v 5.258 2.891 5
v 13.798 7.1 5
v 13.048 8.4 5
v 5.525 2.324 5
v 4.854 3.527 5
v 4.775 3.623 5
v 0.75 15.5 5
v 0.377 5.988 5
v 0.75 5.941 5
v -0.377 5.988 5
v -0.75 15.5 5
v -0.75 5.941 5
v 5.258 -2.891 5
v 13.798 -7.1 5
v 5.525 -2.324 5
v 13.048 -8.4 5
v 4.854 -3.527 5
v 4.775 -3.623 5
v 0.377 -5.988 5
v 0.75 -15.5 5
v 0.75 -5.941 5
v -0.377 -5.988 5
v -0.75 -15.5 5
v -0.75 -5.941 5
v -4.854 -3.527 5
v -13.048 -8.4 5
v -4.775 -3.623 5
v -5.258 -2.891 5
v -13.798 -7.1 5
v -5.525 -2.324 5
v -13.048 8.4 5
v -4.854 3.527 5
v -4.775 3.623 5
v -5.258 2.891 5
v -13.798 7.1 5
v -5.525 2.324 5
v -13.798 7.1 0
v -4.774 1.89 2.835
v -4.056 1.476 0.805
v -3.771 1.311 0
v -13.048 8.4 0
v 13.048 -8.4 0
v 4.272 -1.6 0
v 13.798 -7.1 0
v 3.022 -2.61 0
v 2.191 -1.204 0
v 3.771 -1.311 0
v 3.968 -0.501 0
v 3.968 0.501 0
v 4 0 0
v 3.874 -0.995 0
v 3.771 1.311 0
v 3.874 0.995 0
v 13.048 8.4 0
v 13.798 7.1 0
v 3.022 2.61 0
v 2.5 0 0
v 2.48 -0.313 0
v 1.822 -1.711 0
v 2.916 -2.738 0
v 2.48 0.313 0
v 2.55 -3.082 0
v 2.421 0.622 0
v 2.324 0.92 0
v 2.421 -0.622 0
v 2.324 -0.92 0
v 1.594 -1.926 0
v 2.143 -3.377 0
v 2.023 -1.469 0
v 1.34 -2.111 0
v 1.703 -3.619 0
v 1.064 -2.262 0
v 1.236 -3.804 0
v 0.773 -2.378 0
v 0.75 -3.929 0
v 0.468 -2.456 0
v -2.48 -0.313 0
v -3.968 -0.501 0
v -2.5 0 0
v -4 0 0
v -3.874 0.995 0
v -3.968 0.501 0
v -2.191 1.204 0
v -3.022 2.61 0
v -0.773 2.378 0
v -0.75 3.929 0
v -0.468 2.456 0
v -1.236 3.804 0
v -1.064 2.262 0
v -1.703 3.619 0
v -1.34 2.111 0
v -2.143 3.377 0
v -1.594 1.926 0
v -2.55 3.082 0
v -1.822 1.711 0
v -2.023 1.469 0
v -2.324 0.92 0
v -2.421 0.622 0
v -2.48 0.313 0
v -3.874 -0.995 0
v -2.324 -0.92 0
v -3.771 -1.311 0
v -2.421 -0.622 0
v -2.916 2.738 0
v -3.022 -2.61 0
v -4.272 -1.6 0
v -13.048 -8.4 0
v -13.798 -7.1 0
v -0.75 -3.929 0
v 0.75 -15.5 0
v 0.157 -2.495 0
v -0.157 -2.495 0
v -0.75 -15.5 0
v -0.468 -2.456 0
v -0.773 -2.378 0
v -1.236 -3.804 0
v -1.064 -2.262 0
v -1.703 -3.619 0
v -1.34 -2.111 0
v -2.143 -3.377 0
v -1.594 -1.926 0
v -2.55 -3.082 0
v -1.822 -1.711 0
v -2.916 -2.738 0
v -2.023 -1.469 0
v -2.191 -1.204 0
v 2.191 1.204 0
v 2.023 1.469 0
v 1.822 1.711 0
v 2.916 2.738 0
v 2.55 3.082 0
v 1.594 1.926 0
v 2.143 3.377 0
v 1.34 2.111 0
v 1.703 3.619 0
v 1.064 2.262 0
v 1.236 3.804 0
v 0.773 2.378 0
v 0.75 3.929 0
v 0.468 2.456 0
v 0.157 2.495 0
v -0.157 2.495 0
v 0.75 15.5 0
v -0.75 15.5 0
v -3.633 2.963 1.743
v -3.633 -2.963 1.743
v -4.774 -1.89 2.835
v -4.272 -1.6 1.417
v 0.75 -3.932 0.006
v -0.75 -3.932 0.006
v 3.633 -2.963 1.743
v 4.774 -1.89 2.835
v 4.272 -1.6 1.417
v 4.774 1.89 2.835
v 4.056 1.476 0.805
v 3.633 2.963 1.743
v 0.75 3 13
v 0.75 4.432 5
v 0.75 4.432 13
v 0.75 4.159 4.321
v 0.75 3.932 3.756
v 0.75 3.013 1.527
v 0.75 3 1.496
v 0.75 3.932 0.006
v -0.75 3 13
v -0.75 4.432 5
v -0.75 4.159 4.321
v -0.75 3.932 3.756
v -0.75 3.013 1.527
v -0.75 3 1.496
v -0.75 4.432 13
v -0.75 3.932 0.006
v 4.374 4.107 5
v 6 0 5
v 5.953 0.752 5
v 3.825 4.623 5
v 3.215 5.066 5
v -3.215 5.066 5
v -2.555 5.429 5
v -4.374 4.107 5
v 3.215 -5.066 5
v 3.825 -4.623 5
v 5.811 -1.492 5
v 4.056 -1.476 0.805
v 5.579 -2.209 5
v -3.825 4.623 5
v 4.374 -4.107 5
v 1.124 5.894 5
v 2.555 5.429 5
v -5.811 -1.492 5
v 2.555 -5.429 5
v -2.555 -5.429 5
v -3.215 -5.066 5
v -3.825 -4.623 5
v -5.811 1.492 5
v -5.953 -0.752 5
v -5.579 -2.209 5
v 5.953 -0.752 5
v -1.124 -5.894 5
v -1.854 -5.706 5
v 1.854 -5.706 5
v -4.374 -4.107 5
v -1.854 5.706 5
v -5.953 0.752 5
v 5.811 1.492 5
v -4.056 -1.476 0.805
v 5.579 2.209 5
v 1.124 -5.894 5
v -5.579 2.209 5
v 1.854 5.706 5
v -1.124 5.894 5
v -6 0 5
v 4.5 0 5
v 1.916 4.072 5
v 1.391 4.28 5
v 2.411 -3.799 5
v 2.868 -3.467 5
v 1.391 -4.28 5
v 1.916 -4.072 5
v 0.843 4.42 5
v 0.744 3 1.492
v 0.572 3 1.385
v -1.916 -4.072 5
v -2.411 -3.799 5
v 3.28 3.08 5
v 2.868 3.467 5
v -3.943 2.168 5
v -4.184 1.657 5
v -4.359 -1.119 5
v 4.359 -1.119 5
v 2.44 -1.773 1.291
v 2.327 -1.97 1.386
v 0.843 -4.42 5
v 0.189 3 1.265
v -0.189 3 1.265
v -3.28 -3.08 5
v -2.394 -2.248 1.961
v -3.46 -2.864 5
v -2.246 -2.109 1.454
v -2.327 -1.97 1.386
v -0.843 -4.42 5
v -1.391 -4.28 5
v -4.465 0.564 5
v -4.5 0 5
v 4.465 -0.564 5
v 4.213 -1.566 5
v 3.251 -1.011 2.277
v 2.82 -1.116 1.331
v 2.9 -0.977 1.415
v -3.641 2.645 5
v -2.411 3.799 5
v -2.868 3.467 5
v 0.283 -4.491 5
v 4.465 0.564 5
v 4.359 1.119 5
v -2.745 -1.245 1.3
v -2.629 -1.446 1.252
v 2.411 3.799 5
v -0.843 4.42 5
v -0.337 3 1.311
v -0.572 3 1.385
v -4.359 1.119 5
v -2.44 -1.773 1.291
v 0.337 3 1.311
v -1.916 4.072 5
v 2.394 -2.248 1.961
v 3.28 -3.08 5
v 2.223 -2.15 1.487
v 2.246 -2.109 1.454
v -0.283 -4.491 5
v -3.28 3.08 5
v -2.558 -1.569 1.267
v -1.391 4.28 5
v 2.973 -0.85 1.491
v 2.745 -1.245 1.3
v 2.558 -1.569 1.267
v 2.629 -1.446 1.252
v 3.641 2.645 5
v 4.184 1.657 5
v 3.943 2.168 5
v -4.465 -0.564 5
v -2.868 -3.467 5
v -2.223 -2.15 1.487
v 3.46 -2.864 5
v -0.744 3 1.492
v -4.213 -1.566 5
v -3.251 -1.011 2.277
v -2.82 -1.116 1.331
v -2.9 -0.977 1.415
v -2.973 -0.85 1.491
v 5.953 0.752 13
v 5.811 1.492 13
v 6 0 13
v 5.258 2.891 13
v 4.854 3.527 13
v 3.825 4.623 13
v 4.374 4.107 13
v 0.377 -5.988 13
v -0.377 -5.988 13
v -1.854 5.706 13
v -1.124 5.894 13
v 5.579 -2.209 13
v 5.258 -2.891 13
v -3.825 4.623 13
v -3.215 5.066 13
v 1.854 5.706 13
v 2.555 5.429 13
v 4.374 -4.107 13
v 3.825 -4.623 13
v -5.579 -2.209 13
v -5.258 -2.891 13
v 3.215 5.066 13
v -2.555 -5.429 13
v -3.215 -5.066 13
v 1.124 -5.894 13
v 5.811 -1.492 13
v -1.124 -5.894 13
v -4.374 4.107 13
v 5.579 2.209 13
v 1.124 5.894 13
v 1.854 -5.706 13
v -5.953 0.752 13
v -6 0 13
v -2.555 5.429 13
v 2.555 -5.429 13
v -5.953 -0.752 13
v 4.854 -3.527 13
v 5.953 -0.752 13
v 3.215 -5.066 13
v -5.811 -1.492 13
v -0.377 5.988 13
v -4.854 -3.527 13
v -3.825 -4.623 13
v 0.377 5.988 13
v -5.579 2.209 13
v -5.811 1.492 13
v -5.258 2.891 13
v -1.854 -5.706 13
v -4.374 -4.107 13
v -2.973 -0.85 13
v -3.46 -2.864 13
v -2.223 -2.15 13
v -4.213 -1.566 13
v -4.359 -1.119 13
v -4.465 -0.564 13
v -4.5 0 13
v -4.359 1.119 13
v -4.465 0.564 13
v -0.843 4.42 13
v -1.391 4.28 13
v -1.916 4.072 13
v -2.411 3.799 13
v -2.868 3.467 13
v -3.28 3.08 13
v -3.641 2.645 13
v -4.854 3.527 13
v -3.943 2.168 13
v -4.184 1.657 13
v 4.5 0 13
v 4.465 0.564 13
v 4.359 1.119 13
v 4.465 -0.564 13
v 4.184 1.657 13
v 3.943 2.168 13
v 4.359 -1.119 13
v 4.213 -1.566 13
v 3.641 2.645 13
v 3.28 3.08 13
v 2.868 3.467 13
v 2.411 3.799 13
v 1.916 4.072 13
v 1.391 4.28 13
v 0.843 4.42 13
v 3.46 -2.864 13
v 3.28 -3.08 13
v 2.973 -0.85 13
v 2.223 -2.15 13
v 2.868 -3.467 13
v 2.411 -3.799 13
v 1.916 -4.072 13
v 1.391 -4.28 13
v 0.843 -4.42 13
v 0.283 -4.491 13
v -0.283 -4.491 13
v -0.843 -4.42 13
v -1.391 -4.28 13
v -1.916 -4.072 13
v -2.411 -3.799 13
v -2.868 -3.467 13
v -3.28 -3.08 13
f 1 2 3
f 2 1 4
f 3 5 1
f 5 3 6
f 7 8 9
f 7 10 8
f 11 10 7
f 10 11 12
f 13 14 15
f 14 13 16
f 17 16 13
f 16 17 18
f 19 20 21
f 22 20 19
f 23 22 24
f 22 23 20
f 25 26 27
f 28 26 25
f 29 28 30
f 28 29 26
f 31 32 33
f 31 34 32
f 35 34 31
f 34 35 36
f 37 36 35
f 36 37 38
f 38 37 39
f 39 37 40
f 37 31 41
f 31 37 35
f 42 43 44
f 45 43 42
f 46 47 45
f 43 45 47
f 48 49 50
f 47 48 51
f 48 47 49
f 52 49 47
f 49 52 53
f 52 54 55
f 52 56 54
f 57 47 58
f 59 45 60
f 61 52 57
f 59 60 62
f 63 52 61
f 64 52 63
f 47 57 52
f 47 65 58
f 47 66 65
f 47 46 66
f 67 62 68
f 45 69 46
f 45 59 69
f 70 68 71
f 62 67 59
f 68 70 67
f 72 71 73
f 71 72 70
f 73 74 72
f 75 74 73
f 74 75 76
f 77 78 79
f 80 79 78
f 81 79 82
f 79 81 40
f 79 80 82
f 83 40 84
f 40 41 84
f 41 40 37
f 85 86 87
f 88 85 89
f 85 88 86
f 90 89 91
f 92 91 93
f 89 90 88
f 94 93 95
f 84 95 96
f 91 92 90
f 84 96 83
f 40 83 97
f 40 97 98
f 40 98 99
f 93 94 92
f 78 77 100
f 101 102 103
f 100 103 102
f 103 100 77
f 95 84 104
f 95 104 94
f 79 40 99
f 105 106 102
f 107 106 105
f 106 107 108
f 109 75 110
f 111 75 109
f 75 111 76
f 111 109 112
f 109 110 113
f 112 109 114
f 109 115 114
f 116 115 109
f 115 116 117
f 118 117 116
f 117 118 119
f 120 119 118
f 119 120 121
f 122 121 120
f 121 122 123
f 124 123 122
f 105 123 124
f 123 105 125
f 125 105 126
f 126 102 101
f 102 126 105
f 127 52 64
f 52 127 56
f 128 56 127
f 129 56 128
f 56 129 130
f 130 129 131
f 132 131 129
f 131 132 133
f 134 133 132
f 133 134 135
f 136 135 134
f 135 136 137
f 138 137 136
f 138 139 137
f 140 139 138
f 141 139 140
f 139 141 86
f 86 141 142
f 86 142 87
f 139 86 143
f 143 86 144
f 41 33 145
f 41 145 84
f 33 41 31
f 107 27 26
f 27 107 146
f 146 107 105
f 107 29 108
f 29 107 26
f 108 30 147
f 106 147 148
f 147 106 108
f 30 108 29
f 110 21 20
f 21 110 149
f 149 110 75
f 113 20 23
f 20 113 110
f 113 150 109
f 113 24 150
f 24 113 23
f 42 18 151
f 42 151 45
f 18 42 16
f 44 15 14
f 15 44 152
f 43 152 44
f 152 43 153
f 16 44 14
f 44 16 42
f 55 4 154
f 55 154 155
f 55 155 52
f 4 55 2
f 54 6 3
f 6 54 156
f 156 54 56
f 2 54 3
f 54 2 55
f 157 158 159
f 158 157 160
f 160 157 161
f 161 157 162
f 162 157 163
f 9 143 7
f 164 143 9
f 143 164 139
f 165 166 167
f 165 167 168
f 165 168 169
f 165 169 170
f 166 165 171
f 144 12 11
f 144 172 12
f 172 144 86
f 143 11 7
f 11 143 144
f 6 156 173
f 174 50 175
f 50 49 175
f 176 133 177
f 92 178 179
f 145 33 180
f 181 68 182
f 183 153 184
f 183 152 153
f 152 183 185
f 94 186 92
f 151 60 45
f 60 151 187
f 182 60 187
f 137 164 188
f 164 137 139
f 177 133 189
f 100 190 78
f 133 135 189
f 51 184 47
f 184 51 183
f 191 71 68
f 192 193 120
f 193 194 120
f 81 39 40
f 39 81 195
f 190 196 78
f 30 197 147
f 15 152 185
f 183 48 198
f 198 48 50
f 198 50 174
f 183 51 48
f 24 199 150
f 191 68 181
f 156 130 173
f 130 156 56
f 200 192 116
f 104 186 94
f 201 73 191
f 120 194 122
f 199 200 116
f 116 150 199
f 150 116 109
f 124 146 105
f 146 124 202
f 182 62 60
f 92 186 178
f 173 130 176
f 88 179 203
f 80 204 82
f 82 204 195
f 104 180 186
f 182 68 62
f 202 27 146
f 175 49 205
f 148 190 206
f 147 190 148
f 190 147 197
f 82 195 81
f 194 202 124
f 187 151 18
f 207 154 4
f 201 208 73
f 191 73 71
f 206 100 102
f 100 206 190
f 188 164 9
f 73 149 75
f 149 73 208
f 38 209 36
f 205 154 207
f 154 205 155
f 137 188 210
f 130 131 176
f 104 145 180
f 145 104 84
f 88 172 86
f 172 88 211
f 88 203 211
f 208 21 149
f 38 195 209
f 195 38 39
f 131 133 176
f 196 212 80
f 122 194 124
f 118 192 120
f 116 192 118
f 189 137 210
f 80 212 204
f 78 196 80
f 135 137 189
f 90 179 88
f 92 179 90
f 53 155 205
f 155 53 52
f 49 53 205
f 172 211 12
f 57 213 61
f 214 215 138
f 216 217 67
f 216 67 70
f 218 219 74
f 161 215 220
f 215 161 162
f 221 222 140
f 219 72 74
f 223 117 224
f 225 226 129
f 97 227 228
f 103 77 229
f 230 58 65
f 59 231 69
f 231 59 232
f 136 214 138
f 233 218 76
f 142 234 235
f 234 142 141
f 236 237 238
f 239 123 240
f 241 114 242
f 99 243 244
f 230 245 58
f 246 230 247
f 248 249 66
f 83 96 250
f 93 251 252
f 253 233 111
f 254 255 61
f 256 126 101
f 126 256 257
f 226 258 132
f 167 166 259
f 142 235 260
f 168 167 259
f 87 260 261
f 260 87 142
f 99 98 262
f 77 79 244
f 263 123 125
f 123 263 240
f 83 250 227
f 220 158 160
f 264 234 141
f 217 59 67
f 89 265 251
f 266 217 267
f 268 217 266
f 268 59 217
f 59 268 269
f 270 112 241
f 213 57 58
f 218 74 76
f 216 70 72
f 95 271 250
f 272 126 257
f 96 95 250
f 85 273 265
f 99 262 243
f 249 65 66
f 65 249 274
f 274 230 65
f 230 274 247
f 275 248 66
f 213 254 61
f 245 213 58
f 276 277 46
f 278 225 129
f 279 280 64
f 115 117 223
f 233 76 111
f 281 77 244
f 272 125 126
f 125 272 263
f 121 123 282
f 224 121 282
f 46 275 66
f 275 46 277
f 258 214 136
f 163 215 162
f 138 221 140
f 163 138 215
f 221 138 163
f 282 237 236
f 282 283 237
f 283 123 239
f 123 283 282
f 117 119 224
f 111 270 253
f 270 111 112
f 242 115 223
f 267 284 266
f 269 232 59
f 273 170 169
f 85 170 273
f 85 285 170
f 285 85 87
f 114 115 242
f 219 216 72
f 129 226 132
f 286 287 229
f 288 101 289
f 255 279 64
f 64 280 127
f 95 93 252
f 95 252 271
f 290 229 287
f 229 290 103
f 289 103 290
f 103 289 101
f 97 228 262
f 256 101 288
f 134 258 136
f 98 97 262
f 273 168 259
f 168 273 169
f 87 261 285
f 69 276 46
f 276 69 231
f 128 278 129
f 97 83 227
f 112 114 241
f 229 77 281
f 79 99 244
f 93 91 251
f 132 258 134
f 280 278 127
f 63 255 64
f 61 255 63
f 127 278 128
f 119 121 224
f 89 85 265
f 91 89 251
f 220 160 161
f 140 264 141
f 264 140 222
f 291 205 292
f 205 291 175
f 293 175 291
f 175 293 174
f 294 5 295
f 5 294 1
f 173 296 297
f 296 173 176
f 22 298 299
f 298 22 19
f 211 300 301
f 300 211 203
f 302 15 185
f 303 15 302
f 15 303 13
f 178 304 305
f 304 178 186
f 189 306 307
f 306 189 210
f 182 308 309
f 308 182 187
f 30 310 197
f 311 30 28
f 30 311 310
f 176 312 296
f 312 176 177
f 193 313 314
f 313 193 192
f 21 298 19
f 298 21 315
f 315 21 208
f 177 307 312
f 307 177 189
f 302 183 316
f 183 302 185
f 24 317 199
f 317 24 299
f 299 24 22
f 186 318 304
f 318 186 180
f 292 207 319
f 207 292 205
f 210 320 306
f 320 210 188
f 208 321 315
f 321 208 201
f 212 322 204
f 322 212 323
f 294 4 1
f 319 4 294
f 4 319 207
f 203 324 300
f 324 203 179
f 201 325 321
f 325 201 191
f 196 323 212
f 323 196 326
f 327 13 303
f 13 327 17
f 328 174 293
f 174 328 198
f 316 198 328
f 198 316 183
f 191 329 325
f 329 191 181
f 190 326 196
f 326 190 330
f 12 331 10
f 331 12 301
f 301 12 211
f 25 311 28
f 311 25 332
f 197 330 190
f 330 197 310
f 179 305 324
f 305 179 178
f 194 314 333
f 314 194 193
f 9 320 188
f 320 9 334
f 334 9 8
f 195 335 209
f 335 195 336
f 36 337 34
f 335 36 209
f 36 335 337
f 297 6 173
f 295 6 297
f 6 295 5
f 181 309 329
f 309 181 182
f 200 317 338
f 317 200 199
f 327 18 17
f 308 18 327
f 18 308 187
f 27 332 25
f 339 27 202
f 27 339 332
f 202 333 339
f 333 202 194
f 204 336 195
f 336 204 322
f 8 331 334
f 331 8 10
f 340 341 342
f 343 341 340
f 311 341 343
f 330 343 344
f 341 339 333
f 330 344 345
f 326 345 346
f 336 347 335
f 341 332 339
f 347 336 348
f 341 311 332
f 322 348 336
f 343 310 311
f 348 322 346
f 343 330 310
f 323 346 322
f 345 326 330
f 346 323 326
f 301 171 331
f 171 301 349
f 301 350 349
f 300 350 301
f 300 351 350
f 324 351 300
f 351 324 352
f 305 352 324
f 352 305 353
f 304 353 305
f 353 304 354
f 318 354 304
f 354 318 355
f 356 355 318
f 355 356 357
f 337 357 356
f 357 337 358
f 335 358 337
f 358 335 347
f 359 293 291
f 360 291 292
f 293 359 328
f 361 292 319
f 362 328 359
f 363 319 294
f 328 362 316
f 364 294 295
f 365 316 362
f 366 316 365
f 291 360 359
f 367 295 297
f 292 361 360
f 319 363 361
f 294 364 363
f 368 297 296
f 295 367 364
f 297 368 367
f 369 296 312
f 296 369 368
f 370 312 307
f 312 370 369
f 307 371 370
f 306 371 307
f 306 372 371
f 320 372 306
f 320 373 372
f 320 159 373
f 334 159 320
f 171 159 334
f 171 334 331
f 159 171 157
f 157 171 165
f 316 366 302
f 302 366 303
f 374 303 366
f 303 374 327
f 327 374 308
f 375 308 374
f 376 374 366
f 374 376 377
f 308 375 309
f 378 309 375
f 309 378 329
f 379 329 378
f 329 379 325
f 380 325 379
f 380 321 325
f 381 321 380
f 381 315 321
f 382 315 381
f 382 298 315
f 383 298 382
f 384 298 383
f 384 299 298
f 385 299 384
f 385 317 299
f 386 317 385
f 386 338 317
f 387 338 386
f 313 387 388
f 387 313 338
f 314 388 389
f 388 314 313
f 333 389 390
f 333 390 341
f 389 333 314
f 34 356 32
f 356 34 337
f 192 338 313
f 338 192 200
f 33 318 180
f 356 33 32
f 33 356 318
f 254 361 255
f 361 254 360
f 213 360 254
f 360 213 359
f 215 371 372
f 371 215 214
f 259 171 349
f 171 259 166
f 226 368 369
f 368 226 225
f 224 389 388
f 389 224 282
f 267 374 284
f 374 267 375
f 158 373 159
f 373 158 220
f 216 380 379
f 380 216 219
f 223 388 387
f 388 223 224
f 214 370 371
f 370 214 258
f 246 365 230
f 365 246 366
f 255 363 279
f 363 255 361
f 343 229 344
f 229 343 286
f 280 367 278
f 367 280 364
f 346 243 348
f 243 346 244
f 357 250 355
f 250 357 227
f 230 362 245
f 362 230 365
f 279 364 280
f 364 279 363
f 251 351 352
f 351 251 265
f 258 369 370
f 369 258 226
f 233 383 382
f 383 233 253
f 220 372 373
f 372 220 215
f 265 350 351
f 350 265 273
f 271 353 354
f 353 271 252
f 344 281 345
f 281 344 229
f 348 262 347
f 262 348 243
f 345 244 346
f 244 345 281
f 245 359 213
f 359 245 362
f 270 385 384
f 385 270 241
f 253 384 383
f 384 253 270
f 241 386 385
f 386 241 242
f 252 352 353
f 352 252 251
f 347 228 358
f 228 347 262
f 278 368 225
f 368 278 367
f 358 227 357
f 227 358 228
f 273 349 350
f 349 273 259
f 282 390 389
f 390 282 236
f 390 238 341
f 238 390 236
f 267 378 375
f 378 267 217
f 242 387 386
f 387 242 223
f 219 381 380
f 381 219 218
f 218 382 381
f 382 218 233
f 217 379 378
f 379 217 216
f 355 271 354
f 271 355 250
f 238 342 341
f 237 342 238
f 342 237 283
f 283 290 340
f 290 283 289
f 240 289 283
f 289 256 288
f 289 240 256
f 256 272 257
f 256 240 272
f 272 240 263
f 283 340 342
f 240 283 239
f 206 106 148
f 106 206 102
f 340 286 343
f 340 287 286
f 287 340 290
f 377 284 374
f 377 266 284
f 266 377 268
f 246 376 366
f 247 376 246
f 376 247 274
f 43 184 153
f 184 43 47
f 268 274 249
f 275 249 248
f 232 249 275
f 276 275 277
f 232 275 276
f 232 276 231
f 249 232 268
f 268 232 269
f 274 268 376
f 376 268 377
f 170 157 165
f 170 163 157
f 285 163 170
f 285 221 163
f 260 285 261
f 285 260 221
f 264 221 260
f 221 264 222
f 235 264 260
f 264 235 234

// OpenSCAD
/*
color("red")
translate([14.25, 18.5, 0])
scale([0.75, 0.75, 0.75])
    import("/Users/robby/Desktop/Pump+Impeller/files/WirnikPompkiErr1.stl");
*/

blade_support_or = 4;
blade_support_ir = 2.5;
blade_height = 5;
blade_length = 13;
blade_thickness = 1.5;

latch_or = 6;
latch_ir = 4.5;
latch_height = 8;
clasp_width = 1.5;
clasp_thickness = 1.5;

$fn = 50;
//translate([0,0,1])
difference() {
    union() {
        cylinder(h = blade_height, r1 = blade_support_or, r2 = latch_or);
        
        for (i = [1:6]) {
            rotate_angle = i * (360 / 6);
            rotate([0, 0, rotate_angle])
            translate([-blade_thickness / 2, blade_support_ir, 0])
                cube([blade_thickness, blade_length, blade_height]);
        }
    }
    cylinder(h = blade_height, r1 = blade_support_ir, r2 = latch_ir);
}

translate([0, 0, blade_height]) {
    difference() {
        cylinder(h = latch_height, r = latch_or);
        cylinder(h = latch_height, r = latch_ir);
    }
    
    for (i = [1:3]) {
        rotate([0, 0, i * 360 / 3])
            translate([-clasp_width / 2, latch_ir - clasp_thickness, -blade_height])
                cube([clasp_width, clasp_thickness, latch_height + blade_height]);
    }
}
